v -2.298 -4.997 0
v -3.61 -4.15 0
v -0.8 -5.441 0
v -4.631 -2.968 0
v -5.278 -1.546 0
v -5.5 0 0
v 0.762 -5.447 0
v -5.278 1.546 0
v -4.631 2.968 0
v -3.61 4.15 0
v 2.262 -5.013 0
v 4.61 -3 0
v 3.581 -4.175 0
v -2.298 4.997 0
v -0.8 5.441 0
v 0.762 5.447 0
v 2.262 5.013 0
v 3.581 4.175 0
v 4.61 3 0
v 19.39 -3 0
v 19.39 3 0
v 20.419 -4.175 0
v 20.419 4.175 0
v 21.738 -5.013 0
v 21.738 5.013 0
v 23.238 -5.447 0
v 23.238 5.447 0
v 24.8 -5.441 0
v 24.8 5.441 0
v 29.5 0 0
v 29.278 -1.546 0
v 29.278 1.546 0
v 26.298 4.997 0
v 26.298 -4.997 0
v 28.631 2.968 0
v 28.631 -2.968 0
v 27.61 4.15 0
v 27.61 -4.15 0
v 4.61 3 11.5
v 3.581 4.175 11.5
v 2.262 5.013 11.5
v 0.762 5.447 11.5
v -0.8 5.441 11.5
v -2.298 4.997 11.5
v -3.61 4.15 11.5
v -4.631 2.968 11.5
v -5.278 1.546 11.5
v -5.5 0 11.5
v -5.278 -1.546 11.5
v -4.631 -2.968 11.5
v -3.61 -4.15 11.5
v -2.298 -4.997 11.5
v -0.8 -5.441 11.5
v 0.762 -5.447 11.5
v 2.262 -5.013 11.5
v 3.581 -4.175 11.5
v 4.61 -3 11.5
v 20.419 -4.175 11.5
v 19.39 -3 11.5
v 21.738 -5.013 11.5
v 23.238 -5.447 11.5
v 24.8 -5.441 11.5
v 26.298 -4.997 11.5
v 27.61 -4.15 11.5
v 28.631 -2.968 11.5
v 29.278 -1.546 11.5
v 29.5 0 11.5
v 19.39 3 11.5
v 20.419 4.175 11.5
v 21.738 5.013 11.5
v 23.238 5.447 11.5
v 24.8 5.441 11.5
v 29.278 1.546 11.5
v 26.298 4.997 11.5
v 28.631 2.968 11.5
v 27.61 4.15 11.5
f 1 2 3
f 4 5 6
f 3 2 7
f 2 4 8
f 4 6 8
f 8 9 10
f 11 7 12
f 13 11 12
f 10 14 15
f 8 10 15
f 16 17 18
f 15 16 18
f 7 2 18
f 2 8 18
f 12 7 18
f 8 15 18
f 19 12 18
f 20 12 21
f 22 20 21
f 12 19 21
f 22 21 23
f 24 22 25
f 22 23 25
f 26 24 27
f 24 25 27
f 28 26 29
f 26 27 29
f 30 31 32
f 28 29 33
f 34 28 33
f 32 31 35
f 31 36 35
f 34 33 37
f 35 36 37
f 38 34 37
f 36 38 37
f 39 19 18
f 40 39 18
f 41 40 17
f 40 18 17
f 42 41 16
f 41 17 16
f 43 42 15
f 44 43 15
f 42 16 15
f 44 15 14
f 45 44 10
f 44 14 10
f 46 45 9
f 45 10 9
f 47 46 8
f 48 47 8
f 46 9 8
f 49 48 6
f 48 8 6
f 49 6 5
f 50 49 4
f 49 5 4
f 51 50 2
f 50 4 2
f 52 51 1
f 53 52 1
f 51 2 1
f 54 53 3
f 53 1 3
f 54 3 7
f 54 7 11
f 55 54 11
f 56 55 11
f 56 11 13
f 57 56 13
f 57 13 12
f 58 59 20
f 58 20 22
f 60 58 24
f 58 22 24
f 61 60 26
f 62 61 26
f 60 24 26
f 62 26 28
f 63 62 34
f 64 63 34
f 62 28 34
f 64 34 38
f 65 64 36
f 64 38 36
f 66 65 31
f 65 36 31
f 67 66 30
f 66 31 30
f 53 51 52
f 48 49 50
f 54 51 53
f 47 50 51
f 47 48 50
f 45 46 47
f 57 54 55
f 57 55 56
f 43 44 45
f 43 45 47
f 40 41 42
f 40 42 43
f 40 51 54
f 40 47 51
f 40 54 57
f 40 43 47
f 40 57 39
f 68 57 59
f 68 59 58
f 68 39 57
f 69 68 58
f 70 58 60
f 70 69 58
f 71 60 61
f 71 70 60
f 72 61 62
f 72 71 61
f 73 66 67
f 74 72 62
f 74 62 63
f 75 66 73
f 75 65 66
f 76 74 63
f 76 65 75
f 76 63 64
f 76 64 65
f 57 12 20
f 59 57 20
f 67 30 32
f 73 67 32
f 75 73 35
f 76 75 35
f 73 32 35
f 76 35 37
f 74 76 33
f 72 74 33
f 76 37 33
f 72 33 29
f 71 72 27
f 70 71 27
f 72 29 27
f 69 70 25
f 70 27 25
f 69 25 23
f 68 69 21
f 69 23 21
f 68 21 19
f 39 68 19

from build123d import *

# Parameters (mm, degrees)
F1_DEPTH = 11.5


with BuildPart() as f1:
    # F0 (on Top) → F1 (new body)
    with BuildSketch(Plane.XY):
        with BuildLine():
            ThreePointArc((4.609772, -3), (5.272748, -1.564649), (5.5, 0))
            ThreePointArc((5.5, 0), (5.272748, 1.564649), (4.609772, 3))
            ThreePointArc((4.609772, 3), (-5.5, 0), (4.609772, -3))
        make_face()
        with BuildLine():
            ThreePointArc((4.609772, 3), (5.272748, 1.564649), (5.5, 0))
            ThreePointArc((5.5, 0), (5.272748, -1.564649), (4.609772, -3))
            Line((4.609772, -3), (19.390228, -3))
            ThreePointArc((19.390228, -3), (18.5, 0), (19.390228, 3))
            Line((19.390228, 3), (4.609772, 3))
        make_face()
        with BuildLine():
            ThreePointArc((29.5, 0), (25.564649, 5.272748), (19.390228, 3))
            ThreePointArc((19.390228, 3), (18.5, 0), (19.390228, -3))
            ThreePointArc((19.390228, -3), (25.564649, -5.272748), (29.5, 0))
        make_face()
    extrude(amount=F1_DEPTH)


solid = f1.part
